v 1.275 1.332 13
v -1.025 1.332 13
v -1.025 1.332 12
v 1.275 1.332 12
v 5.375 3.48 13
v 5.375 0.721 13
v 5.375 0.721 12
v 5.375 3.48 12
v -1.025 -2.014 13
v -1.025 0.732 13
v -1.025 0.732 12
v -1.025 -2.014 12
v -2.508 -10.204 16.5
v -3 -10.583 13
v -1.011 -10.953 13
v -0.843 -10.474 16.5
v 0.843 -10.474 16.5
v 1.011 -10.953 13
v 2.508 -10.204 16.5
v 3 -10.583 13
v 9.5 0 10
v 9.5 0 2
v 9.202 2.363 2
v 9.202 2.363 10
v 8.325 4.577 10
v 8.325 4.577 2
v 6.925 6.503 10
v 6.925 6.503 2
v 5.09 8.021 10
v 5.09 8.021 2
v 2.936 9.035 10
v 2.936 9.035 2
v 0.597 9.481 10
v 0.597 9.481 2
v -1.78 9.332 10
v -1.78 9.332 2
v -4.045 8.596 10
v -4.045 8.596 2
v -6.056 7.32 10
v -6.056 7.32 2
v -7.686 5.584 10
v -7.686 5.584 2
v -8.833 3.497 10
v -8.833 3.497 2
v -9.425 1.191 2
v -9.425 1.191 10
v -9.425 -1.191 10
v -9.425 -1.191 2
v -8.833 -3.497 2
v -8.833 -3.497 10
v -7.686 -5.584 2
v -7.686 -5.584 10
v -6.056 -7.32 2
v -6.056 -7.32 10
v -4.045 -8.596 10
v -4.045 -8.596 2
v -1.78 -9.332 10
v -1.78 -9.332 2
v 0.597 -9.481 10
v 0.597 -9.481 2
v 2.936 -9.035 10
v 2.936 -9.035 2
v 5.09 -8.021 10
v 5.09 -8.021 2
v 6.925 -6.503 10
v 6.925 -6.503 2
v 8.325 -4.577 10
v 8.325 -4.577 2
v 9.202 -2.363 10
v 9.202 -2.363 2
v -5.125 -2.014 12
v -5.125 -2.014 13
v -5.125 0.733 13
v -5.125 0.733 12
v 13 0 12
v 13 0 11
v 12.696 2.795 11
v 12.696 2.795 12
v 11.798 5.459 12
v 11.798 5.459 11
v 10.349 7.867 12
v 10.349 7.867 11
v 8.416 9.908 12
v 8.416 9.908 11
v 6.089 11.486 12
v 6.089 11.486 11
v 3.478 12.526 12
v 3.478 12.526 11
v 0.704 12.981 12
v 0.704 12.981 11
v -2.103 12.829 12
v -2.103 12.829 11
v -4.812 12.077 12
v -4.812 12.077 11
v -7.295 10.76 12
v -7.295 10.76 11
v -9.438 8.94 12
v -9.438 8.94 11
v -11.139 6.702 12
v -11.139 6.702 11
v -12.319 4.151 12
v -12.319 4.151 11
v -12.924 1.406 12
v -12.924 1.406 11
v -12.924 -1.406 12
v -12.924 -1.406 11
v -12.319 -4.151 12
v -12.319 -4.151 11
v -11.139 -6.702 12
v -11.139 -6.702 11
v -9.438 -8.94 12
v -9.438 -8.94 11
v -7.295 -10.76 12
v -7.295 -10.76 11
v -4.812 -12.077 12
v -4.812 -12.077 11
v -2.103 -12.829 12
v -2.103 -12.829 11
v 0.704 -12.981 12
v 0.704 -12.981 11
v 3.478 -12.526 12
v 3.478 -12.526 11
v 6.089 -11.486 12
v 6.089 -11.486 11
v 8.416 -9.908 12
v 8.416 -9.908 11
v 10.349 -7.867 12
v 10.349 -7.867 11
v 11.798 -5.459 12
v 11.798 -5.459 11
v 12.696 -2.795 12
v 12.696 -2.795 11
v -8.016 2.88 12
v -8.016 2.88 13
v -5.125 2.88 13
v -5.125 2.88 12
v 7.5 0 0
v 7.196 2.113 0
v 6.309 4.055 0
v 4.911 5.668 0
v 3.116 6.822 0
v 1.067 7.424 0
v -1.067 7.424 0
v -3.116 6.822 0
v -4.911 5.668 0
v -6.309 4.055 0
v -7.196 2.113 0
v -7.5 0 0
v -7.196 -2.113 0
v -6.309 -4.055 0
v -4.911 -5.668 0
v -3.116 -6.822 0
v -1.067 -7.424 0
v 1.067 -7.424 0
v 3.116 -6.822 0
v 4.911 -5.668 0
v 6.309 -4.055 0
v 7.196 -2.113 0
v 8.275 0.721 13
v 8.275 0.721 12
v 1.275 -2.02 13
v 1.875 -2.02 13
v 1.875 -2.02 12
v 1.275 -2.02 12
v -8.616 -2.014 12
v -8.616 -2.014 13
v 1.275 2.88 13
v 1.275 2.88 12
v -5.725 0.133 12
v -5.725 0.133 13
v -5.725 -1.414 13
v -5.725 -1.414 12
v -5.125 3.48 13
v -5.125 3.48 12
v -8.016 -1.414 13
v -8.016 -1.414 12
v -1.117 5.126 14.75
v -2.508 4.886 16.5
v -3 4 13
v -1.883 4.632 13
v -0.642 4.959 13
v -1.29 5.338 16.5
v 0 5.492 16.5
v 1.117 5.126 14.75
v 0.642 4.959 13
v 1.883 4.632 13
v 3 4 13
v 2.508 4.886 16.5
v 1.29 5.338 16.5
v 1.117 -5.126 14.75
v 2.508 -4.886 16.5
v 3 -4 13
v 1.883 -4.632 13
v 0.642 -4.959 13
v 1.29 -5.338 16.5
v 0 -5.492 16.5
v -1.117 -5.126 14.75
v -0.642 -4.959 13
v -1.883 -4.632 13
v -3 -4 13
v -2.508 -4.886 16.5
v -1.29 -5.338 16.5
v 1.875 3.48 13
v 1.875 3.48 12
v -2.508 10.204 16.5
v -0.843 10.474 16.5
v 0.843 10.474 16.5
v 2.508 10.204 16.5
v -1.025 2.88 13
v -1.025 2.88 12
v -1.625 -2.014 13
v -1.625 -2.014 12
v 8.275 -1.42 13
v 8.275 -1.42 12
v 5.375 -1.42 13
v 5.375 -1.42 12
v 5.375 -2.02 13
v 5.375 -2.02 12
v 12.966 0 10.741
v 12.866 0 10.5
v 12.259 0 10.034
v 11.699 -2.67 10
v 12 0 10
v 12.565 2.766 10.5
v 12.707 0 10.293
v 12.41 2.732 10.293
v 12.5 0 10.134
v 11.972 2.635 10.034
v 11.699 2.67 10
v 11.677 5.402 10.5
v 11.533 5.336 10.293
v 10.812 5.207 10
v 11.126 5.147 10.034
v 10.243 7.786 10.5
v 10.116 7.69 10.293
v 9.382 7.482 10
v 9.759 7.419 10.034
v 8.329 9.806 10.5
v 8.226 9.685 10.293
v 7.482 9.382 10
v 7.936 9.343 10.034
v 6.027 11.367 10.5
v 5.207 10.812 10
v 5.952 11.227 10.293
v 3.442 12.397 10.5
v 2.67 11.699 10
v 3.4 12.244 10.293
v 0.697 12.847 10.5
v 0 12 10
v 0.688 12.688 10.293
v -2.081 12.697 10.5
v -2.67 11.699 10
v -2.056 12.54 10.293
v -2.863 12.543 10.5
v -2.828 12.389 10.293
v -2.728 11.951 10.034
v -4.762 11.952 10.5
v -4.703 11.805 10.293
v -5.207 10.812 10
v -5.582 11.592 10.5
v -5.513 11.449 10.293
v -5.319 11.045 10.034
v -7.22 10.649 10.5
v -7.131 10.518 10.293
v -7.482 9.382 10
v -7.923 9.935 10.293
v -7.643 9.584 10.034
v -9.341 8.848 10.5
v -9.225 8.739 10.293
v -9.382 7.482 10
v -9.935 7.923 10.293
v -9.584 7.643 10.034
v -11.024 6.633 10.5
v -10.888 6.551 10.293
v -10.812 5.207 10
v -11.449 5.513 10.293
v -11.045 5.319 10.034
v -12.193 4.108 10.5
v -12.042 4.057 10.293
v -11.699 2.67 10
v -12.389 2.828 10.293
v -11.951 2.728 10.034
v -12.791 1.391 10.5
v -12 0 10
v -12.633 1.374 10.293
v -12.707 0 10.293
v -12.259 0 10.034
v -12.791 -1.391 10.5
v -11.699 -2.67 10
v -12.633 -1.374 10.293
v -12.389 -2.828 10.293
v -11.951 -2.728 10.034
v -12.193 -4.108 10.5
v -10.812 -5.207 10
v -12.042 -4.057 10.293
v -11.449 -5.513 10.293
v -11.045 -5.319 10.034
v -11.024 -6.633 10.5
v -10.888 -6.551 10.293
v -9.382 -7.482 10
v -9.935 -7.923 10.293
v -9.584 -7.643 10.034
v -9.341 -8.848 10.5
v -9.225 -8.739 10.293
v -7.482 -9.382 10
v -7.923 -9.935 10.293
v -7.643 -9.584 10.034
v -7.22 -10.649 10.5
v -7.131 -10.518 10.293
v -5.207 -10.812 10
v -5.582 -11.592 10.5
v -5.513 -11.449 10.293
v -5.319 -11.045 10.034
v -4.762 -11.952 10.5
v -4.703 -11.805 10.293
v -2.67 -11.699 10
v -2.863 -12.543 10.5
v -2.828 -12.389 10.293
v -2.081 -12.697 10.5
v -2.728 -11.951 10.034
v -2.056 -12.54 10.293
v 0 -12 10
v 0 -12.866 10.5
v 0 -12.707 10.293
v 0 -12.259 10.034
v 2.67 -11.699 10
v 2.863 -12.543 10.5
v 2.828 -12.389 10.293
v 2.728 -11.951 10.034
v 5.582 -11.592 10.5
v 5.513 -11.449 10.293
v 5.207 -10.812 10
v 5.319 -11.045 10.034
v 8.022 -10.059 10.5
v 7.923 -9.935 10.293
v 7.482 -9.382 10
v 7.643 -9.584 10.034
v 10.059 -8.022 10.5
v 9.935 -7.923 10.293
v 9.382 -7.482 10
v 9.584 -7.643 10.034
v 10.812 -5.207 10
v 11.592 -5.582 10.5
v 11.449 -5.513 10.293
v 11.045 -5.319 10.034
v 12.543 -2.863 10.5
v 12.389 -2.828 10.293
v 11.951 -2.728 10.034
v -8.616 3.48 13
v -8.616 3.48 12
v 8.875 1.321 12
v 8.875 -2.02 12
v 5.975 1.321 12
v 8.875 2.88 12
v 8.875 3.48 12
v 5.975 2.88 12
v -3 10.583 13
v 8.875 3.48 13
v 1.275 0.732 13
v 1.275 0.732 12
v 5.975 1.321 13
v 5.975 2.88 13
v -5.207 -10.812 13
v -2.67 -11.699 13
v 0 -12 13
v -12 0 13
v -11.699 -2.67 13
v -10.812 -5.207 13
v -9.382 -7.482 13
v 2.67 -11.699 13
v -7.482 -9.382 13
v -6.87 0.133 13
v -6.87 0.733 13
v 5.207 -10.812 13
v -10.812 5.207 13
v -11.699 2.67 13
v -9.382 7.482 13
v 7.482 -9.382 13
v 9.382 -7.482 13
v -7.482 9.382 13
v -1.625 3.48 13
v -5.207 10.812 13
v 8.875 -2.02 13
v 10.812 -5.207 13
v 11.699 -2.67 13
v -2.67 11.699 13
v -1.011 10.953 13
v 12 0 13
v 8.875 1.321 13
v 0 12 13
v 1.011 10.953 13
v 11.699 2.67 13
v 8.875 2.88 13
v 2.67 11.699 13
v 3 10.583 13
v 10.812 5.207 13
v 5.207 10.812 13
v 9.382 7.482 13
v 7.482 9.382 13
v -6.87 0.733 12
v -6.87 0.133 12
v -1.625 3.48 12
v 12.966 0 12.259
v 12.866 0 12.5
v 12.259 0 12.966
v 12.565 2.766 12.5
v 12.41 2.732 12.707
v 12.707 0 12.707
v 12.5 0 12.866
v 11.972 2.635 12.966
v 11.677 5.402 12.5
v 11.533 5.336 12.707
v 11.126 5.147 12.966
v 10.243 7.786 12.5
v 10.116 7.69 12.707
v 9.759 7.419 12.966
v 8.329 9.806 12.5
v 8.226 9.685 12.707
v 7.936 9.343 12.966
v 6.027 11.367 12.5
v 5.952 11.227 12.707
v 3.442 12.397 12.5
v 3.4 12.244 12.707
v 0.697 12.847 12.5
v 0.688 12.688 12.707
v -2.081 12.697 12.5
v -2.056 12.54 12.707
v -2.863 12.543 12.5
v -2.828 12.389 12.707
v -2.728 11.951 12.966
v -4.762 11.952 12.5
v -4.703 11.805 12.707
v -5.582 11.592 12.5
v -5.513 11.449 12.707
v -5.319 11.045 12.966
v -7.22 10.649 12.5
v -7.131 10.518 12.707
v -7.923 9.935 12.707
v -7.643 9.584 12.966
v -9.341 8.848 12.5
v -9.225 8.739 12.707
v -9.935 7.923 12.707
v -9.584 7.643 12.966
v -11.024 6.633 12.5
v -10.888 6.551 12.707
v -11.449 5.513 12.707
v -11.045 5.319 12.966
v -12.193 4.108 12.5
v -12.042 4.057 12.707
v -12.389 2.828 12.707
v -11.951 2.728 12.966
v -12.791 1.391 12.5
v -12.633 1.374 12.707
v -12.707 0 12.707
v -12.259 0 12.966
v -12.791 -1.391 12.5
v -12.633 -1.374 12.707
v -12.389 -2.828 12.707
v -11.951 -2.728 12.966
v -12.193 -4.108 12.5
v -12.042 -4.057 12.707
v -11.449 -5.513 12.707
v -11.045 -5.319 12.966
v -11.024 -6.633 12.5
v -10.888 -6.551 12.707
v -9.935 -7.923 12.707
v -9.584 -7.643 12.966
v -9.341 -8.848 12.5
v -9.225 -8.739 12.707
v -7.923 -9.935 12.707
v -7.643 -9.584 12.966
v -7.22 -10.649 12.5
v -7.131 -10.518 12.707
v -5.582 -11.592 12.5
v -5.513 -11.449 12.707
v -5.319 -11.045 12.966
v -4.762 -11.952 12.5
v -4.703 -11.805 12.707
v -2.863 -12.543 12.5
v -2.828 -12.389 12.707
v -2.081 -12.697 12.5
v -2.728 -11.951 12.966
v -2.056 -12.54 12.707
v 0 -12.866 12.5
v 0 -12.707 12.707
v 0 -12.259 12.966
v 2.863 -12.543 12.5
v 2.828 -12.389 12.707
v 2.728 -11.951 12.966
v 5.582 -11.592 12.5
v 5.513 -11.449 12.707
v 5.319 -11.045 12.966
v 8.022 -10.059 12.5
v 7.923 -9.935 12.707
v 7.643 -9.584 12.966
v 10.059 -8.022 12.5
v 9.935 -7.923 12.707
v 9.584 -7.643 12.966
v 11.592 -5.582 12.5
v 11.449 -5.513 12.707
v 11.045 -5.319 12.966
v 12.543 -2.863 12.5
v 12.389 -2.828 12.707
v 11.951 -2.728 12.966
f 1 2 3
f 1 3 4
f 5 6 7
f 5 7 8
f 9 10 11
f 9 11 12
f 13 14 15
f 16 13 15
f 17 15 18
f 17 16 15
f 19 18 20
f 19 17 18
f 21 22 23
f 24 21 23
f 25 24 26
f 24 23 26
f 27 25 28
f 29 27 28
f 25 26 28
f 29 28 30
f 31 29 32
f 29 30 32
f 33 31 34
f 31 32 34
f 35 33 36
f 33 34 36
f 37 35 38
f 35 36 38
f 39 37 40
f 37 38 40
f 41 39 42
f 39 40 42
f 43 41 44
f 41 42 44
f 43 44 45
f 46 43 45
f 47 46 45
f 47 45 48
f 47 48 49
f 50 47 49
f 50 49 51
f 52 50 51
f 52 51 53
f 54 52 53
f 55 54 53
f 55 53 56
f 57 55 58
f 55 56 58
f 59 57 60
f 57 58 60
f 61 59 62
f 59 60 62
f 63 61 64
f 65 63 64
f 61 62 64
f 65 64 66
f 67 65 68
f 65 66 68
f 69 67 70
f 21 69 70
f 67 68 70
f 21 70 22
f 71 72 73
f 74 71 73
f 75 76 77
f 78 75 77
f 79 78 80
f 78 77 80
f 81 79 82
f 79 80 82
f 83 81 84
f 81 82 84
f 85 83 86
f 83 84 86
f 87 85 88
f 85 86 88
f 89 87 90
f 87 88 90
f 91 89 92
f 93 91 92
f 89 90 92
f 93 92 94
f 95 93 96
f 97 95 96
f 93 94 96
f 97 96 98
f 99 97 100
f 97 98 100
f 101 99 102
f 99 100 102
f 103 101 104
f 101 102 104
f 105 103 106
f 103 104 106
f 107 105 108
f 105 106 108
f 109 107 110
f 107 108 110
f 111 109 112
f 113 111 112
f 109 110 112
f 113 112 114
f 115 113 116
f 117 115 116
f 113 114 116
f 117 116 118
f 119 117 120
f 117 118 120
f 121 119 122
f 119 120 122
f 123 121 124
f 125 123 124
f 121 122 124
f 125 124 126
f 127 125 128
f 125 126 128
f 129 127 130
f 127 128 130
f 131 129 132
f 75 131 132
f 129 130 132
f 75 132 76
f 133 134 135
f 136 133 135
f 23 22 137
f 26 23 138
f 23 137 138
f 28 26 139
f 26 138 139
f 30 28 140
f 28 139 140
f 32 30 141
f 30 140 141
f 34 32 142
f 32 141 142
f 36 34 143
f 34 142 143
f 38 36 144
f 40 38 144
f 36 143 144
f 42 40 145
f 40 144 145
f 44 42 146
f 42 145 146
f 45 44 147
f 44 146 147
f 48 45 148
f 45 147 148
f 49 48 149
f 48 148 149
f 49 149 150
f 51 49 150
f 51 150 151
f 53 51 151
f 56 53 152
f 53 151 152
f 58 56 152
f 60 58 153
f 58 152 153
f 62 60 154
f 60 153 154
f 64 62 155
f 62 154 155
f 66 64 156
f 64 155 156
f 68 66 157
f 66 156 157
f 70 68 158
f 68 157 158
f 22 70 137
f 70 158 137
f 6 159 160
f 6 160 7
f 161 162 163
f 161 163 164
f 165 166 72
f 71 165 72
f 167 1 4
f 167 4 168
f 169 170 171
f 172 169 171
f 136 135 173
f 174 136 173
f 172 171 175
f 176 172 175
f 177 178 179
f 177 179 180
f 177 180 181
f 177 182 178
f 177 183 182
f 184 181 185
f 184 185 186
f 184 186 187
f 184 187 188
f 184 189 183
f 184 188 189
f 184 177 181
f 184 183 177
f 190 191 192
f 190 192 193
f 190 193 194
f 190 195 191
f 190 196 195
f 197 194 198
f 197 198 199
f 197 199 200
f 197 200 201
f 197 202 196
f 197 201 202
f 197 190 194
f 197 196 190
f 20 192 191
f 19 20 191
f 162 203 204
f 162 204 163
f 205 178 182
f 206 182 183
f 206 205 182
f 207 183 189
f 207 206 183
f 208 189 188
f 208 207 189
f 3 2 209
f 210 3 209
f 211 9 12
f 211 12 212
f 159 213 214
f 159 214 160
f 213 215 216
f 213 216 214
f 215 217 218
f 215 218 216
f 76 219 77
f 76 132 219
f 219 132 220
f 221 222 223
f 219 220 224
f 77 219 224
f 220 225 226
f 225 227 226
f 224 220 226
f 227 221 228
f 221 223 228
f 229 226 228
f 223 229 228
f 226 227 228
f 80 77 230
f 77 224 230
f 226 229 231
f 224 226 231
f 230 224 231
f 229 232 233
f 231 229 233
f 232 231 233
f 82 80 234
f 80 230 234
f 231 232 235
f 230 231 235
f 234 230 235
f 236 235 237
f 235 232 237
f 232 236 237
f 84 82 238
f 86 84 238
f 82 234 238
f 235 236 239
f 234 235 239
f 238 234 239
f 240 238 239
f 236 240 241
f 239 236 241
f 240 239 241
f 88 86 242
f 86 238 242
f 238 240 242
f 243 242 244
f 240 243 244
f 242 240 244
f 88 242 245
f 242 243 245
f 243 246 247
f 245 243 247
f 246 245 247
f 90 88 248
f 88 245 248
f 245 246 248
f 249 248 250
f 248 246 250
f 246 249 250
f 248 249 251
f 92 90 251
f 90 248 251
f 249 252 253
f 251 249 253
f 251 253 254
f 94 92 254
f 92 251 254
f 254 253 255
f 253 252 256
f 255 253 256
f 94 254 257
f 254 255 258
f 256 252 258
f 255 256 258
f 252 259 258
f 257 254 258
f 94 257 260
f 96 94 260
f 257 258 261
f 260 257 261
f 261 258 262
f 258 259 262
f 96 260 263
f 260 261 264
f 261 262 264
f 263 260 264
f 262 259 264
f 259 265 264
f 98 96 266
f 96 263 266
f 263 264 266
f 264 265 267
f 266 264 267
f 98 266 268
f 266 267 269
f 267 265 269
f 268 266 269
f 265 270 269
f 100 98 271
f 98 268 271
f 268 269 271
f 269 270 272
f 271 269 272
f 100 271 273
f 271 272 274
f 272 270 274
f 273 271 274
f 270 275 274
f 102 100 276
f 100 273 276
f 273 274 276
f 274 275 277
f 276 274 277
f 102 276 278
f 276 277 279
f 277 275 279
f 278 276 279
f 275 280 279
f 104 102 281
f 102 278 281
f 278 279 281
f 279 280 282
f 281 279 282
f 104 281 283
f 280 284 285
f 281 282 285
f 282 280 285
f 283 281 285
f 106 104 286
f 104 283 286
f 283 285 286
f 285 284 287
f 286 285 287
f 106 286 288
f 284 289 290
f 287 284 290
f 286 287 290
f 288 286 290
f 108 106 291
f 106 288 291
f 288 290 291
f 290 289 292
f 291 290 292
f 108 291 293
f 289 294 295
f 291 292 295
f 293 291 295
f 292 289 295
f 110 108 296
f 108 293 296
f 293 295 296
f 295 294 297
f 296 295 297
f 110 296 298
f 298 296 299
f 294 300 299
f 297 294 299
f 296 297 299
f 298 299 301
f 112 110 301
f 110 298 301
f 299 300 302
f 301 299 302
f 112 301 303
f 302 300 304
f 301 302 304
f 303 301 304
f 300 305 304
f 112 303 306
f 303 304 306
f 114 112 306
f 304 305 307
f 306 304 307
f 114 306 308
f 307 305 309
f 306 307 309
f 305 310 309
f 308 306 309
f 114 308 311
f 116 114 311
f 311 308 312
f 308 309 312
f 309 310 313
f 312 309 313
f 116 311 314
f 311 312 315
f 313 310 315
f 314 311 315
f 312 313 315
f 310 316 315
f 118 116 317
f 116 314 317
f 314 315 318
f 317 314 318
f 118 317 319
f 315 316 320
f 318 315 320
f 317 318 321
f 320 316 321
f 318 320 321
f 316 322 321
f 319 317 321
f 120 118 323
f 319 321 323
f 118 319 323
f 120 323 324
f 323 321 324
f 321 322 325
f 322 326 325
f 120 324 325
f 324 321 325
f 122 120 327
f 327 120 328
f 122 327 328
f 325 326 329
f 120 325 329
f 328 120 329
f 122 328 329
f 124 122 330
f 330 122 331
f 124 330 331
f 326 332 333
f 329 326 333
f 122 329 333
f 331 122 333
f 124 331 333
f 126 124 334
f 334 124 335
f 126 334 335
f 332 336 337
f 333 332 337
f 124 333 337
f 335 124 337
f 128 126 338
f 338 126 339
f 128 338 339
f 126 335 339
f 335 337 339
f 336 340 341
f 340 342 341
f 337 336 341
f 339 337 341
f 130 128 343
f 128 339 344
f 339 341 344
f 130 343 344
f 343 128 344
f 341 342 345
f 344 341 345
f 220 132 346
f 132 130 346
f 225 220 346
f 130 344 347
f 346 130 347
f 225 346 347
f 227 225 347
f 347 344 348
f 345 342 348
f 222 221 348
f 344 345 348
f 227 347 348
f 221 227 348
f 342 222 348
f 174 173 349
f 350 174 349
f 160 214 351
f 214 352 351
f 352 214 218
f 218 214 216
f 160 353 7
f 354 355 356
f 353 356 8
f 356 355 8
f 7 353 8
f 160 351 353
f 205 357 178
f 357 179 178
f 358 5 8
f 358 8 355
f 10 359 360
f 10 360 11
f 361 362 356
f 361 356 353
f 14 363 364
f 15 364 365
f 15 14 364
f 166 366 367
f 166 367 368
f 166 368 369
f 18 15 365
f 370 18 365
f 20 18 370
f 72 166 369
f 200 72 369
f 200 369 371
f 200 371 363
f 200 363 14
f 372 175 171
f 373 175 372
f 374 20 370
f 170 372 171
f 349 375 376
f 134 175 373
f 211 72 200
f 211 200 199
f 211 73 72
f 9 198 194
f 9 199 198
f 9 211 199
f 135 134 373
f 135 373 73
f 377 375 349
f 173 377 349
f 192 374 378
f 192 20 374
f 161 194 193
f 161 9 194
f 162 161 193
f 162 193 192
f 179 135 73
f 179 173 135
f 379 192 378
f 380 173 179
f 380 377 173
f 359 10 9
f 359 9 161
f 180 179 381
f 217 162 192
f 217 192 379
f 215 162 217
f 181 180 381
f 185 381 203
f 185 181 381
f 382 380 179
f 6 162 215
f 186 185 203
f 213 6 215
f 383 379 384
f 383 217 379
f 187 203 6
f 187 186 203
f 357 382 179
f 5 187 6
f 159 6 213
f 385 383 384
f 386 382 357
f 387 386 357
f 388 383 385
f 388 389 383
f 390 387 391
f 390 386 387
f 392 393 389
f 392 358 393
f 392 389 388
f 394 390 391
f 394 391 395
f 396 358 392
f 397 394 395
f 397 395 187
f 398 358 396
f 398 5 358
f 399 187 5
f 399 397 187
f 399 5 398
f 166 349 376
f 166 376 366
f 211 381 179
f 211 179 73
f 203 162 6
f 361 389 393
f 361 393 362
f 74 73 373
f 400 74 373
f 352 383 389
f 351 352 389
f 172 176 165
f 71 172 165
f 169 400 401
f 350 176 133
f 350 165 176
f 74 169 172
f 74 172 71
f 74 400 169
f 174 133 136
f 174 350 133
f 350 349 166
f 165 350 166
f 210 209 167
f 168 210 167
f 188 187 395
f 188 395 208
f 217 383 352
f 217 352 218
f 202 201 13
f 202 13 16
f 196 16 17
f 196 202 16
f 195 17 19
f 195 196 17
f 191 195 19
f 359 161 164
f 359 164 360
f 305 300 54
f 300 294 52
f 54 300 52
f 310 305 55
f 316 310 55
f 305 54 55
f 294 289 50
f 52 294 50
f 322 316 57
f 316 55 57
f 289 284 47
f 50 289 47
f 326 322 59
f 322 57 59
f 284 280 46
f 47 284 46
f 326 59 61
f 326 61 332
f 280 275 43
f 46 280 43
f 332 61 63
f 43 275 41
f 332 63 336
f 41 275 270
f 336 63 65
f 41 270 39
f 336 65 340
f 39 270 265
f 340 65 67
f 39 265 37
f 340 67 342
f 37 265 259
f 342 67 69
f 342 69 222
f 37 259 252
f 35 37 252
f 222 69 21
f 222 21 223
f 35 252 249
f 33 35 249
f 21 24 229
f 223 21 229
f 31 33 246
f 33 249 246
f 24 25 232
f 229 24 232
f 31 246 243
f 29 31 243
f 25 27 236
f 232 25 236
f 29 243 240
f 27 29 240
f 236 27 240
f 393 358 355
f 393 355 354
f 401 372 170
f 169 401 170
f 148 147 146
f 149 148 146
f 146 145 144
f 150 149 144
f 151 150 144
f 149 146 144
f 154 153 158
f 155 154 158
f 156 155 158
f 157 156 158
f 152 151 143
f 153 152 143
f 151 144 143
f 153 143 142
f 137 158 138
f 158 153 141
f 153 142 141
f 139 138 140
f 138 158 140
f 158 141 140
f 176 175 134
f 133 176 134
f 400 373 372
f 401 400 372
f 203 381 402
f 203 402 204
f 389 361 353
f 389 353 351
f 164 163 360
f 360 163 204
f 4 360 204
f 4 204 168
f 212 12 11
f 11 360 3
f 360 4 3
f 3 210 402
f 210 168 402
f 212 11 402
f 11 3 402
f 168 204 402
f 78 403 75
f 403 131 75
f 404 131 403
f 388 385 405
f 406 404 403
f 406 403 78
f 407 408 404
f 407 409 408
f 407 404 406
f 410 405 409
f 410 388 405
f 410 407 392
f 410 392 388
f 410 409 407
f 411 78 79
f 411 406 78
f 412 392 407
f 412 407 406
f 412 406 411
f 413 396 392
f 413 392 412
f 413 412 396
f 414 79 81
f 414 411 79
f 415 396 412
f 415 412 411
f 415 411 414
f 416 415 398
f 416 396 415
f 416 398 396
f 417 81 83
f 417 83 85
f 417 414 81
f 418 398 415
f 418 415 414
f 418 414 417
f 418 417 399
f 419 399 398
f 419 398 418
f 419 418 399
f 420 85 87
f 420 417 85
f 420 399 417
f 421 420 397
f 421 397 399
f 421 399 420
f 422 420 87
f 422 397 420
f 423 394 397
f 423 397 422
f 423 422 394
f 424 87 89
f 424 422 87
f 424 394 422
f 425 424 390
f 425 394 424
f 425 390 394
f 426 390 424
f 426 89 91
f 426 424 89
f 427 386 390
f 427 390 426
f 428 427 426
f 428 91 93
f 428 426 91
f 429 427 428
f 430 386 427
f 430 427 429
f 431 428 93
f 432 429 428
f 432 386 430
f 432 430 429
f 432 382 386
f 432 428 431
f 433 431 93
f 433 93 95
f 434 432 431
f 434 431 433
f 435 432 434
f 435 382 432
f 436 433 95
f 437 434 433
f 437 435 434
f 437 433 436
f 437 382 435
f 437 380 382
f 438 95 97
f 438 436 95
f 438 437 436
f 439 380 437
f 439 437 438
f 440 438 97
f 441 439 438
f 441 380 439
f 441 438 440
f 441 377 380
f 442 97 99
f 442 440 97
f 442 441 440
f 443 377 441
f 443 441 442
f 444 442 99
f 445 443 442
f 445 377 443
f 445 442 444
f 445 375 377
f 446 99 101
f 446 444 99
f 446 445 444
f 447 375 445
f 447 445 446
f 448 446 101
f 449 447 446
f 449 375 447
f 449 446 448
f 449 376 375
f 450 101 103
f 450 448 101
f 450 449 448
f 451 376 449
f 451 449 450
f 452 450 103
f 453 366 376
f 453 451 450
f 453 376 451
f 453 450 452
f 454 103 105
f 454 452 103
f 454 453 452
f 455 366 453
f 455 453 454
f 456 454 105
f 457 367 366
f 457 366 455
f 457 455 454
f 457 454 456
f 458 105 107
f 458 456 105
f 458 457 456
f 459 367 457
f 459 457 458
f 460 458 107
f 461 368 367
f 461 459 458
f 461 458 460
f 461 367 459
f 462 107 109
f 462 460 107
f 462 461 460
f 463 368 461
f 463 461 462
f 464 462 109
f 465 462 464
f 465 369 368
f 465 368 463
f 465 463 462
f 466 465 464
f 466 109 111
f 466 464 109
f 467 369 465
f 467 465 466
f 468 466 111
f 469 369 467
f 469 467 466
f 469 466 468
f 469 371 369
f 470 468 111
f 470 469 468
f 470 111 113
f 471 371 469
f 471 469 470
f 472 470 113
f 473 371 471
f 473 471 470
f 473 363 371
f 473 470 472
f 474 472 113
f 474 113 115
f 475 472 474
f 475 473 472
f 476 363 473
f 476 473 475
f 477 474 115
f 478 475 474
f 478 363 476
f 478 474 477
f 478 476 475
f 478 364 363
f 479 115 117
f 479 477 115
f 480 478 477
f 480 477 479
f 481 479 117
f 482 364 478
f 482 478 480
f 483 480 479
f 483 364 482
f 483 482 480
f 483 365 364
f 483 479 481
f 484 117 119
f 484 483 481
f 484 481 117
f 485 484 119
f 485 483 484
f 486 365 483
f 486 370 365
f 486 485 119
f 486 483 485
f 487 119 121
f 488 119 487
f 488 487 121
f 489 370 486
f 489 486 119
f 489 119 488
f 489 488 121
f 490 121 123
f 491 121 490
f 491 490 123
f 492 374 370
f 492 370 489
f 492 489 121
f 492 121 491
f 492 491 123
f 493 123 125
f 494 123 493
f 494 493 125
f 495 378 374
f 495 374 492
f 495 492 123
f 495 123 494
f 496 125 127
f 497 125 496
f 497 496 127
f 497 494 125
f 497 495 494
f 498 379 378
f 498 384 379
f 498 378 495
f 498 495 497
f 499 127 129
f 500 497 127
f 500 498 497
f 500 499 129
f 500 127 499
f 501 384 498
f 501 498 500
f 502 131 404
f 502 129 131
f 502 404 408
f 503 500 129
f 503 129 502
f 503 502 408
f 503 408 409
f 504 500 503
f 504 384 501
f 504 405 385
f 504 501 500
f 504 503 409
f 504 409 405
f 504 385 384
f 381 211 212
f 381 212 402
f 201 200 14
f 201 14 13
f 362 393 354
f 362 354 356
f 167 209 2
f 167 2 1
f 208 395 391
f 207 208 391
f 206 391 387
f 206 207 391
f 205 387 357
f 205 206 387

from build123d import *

# Parameters (mm, degrees)
SKETCH1_R           = 9.5
BOSS_EXTRUDE1_DEPTH = 10
CHAMFER1_SIZE       = 2
SKETCH2_R           = 13
BOSS_EXTRUDE2_DEPTH = 3
BOSS_EXTRUDE3_DEPTH = 3.5
BOSS_EXTRUDE3_TAPER = 8
FILLET1_R           = 1
SKETCH3_W           = 2.3
SKETCH3_H           = 1.548065916
CUT_EXTRUDE1_DEPTH  = 1


with BuildPart() as part:
    # Sketch1 → Boss-Extrude1 (new body)
    with BuildSketch(Plane.XY):
        Circle(SKETCH1_R)
    extrude(amount=BOSS_EXTRUDE1_DEPTH)

    # Chamfer1
    chamfer1_edges = [part.edges().sort_by_distance(p)[0] for p in [
        (-9.5, 0, 0),
    ]]
    chamfer(chamfer1_edges, length=CHAMFER1_SIZE)

    # Sketch2 → Boss-Extrude2 (add)
    with BuildSketch(Plane.XY.offset(10)):
        Circle(SKETCH2_R)
    extrude(amount=BOSS_EXTRUDE2_DEPTH)

    # Sketch4 → Boss-Extrude3 (add)
    with BuildSketch(Plane.XY.offset(13)):
        with BuildLine():
            ThreePointArc((3, 10.583005244), (0, 11), (-3, 10.583005244))
            Line((-3, 10.583005244), (-3, 4))
            ThreePointArc((-3, 4), (0, 5), (3, 4))
            Line((3, 4), (3, 10.583005244))
        make_face()
        with BuildLine():
            ThreePointArc((3, -4), (0, -5), (-3, -4))
            Line((-3, -4), (-3, -10.583005244))
            ThreePointArc((-3, -10.583005244), (0, -11), (3, -10.583005244))
            Line((3, -10.583005244), (3, -4))
        make_face()
    extrude(amount=BOSS_EXTRUDE3_DEPTH, taper=BOSS_EXTRUDE3_TAPER)

    # Fillet1
    fillet1_edges = [part.edges().sort_by_distance(p)[0] for p in [
        (-13, 0, 10),
        (-13, 0, 13),
    ]]
    fillet(fillet1_edges, radius=FILLET1_R)

    # Sketch3 → Cut-Extrude1 (cut)
    with BuildSketch(Plane.XY.offset(13)):
        Polygon((-1.625120105, -2.013905208), (-1.625120105, 3.480258709), (1.874879895, 3.480258709), (1.874879895, -2.019741291), (1.274879895, -2.019741291), (1.274879895, 0.732192793), (-1.025120105, 0.732192793), (-1.025120105, -2.013905208), align=None)
        with Locations((0.124879895, 2.106225751)):
            Rectangle(SKETCH3_W, SKETCH3_H, mode=Mode.SUBTRACT)
        Polygon((5.374879895, 3.480258709), (8.874879895, 3.480258709), (8.874879895, 2.880258709), (5.974879895, 2.880258709), (5.974879895, 1.320855687), (8.874879895, 1.320855687), (8.874879895, -1.419741291), (8.874879895, -2.019741291), (5.374879895, -2.019741291), (5.374879895, -1.419741291), (8.274879895, -1.419741291), (8.274879895, 0.720855687), (5.374879895, 0.720855687), align=None)
        Polygon((-8.615536657, 3.480258709), (-8.615536657, -2.013905208), (-5.125120105, -2.013905208), (-5.125120105, 0.73317675), (-6.870328381, 0.73317675), (-6.870328381, 0.13317675), (-5.725120105, 0.13317675), (-5.725120105, -1.413905208), (-8.015536657, -1.413905208), (-8.015536657, 2.880258709), (-5.125120105, 2.880258709), (-5.125120105, 3.480258709), align=None)
    extrude(amount=-CUT_EXTRUDE1_DEPTH, mode=Mode.SUBTRACT)


solid = part.part
